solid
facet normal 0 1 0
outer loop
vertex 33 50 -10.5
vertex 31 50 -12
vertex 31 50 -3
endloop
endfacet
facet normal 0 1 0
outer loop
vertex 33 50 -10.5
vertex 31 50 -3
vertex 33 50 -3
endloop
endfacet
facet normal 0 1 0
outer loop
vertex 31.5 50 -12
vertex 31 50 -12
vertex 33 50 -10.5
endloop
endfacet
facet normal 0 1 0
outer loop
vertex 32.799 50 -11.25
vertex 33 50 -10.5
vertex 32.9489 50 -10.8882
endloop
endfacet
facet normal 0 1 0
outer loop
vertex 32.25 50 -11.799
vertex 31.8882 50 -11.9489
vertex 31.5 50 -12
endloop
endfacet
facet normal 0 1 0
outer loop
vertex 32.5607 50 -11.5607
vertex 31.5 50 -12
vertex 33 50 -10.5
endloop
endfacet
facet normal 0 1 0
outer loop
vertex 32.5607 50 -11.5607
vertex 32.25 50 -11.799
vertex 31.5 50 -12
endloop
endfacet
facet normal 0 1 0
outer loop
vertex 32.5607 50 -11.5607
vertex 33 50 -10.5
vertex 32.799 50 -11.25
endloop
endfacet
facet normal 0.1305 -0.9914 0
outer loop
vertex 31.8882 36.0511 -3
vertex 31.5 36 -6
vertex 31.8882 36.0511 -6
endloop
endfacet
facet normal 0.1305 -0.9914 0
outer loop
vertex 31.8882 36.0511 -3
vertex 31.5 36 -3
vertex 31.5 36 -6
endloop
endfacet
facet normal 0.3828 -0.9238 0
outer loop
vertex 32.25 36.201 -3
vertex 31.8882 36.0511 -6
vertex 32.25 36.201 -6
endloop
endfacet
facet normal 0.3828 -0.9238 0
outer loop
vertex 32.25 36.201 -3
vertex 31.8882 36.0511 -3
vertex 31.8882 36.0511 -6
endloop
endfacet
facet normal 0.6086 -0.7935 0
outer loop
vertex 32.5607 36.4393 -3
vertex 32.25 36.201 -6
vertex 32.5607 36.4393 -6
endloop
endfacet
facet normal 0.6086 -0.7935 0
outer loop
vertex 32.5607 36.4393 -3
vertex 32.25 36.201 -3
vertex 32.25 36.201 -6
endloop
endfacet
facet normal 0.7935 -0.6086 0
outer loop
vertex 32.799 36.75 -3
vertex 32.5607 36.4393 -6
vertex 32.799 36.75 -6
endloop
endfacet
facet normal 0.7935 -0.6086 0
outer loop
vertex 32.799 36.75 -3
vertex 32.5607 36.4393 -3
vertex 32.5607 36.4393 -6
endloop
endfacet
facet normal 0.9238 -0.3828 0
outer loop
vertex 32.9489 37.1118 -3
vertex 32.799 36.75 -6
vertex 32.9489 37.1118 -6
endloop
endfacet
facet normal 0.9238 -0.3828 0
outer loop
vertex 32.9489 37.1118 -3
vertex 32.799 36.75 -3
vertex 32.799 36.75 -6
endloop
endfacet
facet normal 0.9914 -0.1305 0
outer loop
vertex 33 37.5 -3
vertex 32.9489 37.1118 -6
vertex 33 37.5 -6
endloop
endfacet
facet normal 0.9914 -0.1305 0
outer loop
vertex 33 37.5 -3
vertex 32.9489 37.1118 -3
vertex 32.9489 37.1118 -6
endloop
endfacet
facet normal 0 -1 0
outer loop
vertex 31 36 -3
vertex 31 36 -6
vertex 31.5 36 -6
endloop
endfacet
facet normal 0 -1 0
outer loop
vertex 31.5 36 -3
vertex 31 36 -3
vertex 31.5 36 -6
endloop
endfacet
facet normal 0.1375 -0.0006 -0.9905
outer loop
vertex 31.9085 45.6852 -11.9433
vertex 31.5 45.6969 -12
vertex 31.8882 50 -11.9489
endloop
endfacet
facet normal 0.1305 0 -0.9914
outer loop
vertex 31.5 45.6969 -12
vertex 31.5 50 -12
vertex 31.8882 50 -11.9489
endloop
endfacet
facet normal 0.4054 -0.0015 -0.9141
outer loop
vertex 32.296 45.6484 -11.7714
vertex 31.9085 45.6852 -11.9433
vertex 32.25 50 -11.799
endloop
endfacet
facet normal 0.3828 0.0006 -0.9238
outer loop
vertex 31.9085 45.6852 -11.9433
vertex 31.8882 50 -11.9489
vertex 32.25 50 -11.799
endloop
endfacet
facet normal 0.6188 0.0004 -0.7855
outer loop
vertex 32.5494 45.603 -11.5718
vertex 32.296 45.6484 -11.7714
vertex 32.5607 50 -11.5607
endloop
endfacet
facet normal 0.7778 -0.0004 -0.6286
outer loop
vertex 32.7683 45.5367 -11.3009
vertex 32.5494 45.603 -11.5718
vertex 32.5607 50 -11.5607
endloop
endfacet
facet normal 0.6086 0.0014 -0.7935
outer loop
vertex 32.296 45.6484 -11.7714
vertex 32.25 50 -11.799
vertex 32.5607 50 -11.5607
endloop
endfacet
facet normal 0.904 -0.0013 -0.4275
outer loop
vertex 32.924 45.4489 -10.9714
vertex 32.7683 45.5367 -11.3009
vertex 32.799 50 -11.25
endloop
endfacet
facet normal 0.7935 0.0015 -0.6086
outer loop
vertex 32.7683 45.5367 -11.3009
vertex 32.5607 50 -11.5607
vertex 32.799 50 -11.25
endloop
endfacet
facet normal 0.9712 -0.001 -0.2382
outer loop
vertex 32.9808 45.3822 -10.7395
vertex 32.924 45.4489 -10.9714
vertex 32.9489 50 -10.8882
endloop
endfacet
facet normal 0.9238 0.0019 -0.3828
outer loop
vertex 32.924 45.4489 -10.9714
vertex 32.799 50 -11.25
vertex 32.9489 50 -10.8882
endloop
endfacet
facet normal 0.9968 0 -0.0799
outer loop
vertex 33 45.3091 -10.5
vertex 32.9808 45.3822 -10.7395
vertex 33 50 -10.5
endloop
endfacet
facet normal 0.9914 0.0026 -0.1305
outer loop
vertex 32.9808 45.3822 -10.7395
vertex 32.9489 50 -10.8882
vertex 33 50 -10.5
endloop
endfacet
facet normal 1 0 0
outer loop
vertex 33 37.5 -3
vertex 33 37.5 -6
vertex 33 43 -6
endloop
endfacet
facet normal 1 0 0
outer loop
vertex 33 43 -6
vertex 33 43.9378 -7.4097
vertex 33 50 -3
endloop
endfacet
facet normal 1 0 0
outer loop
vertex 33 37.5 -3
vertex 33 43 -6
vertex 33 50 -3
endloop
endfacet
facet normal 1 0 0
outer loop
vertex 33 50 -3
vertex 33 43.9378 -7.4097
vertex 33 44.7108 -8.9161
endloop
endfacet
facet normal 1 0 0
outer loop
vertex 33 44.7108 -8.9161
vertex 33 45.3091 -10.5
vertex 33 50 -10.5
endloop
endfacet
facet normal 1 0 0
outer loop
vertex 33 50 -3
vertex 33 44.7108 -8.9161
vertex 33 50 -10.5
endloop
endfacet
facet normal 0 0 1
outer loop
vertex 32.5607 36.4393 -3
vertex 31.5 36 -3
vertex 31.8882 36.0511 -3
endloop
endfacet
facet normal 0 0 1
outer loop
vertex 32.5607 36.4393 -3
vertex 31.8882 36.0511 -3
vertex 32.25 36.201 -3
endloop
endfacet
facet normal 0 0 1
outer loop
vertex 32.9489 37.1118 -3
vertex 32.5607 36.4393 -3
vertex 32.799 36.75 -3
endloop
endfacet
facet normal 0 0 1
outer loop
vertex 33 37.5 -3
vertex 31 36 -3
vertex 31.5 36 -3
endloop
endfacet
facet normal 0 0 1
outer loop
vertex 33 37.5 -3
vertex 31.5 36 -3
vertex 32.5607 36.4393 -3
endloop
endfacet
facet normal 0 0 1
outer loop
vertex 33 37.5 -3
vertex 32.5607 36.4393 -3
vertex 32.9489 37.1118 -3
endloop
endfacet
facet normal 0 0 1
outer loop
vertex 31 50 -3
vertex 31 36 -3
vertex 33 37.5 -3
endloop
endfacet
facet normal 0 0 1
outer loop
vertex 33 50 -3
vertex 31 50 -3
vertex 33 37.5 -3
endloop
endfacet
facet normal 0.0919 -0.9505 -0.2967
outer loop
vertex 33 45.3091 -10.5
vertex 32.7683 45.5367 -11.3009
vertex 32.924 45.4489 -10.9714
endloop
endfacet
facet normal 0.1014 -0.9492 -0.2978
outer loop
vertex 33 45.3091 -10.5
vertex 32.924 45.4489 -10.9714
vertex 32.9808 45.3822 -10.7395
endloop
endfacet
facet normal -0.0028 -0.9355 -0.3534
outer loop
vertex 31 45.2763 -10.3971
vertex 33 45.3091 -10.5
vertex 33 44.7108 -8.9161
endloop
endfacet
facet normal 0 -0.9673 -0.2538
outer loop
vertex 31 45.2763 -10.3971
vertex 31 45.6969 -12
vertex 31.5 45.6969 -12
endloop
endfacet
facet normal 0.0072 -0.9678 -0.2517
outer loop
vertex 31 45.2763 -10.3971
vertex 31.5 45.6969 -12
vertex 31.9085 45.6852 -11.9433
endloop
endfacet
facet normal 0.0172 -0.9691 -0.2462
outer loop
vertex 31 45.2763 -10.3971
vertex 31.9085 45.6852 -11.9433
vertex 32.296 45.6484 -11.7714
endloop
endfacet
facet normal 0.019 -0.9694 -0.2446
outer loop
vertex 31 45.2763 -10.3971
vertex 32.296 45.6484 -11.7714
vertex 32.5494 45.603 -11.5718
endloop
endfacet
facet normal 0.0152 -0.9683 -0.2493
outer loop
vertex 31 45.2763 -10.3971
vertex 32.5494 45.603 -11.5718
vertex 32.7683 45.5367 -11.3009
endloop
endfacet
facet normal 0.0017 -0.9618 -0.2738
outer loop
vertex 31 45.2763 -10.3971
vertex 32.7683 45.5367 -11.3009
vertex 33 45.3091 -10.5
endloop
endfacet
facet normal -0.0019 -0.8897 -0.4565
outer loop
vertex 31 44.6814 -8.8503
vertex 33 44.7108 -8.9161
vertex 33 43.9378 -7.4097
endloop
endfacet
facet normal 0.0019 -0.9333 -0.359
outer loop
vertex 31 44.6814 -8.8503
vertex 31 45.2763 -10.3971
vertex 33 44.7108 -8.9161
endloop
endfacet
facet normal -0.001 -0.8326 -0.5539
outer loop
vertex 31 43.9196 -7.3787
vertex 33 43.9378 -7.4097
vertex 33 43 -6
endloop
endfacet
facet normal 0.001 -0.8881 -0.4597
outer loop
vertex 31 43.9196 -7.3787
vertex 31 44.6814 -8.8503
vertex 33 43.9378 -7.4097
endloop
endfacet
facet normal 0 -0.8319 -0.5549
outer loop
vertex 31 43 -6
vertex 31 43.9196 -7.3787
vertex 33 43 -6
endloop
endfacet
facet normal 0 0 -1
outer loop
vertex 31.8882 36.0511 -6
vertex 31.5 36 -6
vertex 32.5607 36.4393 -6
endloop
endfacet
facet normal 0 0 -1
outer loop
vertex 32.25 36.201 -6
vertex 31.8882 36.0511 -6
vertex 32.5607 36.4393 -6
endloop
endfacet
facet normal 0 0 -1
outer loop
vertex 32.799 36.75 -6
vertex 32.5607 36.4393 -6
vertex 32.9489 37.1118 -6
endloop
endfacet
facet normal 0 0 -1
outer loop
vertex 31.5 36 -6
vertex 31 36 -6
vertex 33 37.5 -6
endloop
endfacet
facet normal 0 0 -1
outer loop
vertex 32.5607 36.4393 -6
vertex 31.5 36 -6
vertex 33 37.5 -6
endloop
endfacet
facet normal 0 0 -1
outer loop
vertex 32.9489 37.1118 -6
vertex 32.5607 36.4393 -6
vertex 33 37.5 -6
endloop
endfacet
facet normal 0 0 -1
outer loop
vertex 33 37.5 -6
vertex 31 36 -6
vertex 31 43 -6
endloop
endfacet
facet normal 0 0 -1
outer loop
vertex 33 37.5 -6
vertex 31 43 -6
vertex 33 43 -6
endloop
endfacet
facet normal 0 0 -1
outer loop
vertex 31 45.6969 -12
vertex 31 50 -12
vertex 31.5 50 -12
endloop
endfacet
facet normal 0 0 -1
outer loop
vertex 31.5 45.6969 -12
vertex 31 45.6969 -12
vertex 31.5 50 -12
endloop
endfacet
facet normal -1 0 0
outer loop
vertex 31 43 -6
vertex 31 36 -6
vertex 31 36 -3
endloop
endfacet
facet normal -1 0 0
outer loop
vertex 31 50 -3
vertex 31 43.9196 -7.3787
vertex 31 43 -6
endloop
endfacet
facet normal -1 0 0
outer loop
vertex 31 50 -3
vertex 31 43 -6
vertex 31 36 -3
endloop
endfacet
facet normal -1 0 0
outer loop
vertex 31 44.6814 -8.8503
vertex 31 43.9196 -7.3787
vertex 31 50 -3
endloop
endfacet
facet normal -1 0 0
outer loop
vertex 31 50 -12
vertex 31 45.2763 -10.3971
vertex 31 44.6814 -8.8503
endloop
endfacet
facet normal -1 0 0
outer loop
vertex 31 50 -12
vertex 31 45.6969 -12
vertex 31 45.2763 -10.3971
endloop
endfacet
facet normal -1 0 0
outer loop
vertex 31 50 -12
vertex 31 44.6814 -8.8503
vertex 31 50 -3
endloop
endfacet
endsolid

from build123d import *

# Parameters (mm, degrees)
BOX092_W          = 2
BOX092_H          = 14
BOX092_DEPTH      = 3
FILLET012_R       = 1.5
CYLINDER046_R     = 15
CYLINDER046_DEPTH = 4
BOX094_W          = 2
BOX094_H          = 10
BOX094_DEPTH      = 6
FILLET058_R       = 1.5


with BuildPart() as fillet012:
    # Box092 → Box092 (new body)
    with BuildSketch(Plane(origin=(31, 36, -6), x_dir=(1, 0, 0), z_dir=(0, 0, 1))):
        with Locations((1, 7)):
            Rectangle(BOX092_W, BOX092_H)
    extrude(amount=BOX092_DEPTH)

    # Fillet012
    fillet012_edges = [fillet012.edges().sort_by_distance(p)[0] for p in [
        (33, 36, -4.5),
    ]]
    fillet(fillet012_edges, radius=FILLET012_R)


with BuildPart() as cylinder130:
    # Cylinder046 → Cylinder046 (new body)
    with BuildSketch(Plane(origin=(30, 31, -15), x_dir=(0, 0, -1), z_dir=(1, 0, 0))):
        Circle(CYLINDER046_R)
    extrude(amount=CYLINDER046_DEPTH)


with BuildPart() as fusion073:
    # Box094 → Box094 (new body)
    with BuildSketch(Plane(origin=(31, 40, -12), x_dir=(1, 0, 0), z_dir=(0, 0, 1))):
        with Locations((1, 5)):
            Rectangle(BOX094_W, BOX094_H)
    extrude(amount=BOX094_DEPTH)

    # Cut121: cut Cylinder130
    add(cylinder130.part, mode=Mode.SUBTRACT)

    # Fillet058
    fillet058_edges = [fusion073.edges().sort_by_distance(p)[0] for p in [
        (33, 47.848469, -12),
    ]]
    fillet(fillet058_edges, radius=FILLET058_R)

    # Fusion073: union Fillet012
    add(fillet012.part)


solid = fusion073.part
